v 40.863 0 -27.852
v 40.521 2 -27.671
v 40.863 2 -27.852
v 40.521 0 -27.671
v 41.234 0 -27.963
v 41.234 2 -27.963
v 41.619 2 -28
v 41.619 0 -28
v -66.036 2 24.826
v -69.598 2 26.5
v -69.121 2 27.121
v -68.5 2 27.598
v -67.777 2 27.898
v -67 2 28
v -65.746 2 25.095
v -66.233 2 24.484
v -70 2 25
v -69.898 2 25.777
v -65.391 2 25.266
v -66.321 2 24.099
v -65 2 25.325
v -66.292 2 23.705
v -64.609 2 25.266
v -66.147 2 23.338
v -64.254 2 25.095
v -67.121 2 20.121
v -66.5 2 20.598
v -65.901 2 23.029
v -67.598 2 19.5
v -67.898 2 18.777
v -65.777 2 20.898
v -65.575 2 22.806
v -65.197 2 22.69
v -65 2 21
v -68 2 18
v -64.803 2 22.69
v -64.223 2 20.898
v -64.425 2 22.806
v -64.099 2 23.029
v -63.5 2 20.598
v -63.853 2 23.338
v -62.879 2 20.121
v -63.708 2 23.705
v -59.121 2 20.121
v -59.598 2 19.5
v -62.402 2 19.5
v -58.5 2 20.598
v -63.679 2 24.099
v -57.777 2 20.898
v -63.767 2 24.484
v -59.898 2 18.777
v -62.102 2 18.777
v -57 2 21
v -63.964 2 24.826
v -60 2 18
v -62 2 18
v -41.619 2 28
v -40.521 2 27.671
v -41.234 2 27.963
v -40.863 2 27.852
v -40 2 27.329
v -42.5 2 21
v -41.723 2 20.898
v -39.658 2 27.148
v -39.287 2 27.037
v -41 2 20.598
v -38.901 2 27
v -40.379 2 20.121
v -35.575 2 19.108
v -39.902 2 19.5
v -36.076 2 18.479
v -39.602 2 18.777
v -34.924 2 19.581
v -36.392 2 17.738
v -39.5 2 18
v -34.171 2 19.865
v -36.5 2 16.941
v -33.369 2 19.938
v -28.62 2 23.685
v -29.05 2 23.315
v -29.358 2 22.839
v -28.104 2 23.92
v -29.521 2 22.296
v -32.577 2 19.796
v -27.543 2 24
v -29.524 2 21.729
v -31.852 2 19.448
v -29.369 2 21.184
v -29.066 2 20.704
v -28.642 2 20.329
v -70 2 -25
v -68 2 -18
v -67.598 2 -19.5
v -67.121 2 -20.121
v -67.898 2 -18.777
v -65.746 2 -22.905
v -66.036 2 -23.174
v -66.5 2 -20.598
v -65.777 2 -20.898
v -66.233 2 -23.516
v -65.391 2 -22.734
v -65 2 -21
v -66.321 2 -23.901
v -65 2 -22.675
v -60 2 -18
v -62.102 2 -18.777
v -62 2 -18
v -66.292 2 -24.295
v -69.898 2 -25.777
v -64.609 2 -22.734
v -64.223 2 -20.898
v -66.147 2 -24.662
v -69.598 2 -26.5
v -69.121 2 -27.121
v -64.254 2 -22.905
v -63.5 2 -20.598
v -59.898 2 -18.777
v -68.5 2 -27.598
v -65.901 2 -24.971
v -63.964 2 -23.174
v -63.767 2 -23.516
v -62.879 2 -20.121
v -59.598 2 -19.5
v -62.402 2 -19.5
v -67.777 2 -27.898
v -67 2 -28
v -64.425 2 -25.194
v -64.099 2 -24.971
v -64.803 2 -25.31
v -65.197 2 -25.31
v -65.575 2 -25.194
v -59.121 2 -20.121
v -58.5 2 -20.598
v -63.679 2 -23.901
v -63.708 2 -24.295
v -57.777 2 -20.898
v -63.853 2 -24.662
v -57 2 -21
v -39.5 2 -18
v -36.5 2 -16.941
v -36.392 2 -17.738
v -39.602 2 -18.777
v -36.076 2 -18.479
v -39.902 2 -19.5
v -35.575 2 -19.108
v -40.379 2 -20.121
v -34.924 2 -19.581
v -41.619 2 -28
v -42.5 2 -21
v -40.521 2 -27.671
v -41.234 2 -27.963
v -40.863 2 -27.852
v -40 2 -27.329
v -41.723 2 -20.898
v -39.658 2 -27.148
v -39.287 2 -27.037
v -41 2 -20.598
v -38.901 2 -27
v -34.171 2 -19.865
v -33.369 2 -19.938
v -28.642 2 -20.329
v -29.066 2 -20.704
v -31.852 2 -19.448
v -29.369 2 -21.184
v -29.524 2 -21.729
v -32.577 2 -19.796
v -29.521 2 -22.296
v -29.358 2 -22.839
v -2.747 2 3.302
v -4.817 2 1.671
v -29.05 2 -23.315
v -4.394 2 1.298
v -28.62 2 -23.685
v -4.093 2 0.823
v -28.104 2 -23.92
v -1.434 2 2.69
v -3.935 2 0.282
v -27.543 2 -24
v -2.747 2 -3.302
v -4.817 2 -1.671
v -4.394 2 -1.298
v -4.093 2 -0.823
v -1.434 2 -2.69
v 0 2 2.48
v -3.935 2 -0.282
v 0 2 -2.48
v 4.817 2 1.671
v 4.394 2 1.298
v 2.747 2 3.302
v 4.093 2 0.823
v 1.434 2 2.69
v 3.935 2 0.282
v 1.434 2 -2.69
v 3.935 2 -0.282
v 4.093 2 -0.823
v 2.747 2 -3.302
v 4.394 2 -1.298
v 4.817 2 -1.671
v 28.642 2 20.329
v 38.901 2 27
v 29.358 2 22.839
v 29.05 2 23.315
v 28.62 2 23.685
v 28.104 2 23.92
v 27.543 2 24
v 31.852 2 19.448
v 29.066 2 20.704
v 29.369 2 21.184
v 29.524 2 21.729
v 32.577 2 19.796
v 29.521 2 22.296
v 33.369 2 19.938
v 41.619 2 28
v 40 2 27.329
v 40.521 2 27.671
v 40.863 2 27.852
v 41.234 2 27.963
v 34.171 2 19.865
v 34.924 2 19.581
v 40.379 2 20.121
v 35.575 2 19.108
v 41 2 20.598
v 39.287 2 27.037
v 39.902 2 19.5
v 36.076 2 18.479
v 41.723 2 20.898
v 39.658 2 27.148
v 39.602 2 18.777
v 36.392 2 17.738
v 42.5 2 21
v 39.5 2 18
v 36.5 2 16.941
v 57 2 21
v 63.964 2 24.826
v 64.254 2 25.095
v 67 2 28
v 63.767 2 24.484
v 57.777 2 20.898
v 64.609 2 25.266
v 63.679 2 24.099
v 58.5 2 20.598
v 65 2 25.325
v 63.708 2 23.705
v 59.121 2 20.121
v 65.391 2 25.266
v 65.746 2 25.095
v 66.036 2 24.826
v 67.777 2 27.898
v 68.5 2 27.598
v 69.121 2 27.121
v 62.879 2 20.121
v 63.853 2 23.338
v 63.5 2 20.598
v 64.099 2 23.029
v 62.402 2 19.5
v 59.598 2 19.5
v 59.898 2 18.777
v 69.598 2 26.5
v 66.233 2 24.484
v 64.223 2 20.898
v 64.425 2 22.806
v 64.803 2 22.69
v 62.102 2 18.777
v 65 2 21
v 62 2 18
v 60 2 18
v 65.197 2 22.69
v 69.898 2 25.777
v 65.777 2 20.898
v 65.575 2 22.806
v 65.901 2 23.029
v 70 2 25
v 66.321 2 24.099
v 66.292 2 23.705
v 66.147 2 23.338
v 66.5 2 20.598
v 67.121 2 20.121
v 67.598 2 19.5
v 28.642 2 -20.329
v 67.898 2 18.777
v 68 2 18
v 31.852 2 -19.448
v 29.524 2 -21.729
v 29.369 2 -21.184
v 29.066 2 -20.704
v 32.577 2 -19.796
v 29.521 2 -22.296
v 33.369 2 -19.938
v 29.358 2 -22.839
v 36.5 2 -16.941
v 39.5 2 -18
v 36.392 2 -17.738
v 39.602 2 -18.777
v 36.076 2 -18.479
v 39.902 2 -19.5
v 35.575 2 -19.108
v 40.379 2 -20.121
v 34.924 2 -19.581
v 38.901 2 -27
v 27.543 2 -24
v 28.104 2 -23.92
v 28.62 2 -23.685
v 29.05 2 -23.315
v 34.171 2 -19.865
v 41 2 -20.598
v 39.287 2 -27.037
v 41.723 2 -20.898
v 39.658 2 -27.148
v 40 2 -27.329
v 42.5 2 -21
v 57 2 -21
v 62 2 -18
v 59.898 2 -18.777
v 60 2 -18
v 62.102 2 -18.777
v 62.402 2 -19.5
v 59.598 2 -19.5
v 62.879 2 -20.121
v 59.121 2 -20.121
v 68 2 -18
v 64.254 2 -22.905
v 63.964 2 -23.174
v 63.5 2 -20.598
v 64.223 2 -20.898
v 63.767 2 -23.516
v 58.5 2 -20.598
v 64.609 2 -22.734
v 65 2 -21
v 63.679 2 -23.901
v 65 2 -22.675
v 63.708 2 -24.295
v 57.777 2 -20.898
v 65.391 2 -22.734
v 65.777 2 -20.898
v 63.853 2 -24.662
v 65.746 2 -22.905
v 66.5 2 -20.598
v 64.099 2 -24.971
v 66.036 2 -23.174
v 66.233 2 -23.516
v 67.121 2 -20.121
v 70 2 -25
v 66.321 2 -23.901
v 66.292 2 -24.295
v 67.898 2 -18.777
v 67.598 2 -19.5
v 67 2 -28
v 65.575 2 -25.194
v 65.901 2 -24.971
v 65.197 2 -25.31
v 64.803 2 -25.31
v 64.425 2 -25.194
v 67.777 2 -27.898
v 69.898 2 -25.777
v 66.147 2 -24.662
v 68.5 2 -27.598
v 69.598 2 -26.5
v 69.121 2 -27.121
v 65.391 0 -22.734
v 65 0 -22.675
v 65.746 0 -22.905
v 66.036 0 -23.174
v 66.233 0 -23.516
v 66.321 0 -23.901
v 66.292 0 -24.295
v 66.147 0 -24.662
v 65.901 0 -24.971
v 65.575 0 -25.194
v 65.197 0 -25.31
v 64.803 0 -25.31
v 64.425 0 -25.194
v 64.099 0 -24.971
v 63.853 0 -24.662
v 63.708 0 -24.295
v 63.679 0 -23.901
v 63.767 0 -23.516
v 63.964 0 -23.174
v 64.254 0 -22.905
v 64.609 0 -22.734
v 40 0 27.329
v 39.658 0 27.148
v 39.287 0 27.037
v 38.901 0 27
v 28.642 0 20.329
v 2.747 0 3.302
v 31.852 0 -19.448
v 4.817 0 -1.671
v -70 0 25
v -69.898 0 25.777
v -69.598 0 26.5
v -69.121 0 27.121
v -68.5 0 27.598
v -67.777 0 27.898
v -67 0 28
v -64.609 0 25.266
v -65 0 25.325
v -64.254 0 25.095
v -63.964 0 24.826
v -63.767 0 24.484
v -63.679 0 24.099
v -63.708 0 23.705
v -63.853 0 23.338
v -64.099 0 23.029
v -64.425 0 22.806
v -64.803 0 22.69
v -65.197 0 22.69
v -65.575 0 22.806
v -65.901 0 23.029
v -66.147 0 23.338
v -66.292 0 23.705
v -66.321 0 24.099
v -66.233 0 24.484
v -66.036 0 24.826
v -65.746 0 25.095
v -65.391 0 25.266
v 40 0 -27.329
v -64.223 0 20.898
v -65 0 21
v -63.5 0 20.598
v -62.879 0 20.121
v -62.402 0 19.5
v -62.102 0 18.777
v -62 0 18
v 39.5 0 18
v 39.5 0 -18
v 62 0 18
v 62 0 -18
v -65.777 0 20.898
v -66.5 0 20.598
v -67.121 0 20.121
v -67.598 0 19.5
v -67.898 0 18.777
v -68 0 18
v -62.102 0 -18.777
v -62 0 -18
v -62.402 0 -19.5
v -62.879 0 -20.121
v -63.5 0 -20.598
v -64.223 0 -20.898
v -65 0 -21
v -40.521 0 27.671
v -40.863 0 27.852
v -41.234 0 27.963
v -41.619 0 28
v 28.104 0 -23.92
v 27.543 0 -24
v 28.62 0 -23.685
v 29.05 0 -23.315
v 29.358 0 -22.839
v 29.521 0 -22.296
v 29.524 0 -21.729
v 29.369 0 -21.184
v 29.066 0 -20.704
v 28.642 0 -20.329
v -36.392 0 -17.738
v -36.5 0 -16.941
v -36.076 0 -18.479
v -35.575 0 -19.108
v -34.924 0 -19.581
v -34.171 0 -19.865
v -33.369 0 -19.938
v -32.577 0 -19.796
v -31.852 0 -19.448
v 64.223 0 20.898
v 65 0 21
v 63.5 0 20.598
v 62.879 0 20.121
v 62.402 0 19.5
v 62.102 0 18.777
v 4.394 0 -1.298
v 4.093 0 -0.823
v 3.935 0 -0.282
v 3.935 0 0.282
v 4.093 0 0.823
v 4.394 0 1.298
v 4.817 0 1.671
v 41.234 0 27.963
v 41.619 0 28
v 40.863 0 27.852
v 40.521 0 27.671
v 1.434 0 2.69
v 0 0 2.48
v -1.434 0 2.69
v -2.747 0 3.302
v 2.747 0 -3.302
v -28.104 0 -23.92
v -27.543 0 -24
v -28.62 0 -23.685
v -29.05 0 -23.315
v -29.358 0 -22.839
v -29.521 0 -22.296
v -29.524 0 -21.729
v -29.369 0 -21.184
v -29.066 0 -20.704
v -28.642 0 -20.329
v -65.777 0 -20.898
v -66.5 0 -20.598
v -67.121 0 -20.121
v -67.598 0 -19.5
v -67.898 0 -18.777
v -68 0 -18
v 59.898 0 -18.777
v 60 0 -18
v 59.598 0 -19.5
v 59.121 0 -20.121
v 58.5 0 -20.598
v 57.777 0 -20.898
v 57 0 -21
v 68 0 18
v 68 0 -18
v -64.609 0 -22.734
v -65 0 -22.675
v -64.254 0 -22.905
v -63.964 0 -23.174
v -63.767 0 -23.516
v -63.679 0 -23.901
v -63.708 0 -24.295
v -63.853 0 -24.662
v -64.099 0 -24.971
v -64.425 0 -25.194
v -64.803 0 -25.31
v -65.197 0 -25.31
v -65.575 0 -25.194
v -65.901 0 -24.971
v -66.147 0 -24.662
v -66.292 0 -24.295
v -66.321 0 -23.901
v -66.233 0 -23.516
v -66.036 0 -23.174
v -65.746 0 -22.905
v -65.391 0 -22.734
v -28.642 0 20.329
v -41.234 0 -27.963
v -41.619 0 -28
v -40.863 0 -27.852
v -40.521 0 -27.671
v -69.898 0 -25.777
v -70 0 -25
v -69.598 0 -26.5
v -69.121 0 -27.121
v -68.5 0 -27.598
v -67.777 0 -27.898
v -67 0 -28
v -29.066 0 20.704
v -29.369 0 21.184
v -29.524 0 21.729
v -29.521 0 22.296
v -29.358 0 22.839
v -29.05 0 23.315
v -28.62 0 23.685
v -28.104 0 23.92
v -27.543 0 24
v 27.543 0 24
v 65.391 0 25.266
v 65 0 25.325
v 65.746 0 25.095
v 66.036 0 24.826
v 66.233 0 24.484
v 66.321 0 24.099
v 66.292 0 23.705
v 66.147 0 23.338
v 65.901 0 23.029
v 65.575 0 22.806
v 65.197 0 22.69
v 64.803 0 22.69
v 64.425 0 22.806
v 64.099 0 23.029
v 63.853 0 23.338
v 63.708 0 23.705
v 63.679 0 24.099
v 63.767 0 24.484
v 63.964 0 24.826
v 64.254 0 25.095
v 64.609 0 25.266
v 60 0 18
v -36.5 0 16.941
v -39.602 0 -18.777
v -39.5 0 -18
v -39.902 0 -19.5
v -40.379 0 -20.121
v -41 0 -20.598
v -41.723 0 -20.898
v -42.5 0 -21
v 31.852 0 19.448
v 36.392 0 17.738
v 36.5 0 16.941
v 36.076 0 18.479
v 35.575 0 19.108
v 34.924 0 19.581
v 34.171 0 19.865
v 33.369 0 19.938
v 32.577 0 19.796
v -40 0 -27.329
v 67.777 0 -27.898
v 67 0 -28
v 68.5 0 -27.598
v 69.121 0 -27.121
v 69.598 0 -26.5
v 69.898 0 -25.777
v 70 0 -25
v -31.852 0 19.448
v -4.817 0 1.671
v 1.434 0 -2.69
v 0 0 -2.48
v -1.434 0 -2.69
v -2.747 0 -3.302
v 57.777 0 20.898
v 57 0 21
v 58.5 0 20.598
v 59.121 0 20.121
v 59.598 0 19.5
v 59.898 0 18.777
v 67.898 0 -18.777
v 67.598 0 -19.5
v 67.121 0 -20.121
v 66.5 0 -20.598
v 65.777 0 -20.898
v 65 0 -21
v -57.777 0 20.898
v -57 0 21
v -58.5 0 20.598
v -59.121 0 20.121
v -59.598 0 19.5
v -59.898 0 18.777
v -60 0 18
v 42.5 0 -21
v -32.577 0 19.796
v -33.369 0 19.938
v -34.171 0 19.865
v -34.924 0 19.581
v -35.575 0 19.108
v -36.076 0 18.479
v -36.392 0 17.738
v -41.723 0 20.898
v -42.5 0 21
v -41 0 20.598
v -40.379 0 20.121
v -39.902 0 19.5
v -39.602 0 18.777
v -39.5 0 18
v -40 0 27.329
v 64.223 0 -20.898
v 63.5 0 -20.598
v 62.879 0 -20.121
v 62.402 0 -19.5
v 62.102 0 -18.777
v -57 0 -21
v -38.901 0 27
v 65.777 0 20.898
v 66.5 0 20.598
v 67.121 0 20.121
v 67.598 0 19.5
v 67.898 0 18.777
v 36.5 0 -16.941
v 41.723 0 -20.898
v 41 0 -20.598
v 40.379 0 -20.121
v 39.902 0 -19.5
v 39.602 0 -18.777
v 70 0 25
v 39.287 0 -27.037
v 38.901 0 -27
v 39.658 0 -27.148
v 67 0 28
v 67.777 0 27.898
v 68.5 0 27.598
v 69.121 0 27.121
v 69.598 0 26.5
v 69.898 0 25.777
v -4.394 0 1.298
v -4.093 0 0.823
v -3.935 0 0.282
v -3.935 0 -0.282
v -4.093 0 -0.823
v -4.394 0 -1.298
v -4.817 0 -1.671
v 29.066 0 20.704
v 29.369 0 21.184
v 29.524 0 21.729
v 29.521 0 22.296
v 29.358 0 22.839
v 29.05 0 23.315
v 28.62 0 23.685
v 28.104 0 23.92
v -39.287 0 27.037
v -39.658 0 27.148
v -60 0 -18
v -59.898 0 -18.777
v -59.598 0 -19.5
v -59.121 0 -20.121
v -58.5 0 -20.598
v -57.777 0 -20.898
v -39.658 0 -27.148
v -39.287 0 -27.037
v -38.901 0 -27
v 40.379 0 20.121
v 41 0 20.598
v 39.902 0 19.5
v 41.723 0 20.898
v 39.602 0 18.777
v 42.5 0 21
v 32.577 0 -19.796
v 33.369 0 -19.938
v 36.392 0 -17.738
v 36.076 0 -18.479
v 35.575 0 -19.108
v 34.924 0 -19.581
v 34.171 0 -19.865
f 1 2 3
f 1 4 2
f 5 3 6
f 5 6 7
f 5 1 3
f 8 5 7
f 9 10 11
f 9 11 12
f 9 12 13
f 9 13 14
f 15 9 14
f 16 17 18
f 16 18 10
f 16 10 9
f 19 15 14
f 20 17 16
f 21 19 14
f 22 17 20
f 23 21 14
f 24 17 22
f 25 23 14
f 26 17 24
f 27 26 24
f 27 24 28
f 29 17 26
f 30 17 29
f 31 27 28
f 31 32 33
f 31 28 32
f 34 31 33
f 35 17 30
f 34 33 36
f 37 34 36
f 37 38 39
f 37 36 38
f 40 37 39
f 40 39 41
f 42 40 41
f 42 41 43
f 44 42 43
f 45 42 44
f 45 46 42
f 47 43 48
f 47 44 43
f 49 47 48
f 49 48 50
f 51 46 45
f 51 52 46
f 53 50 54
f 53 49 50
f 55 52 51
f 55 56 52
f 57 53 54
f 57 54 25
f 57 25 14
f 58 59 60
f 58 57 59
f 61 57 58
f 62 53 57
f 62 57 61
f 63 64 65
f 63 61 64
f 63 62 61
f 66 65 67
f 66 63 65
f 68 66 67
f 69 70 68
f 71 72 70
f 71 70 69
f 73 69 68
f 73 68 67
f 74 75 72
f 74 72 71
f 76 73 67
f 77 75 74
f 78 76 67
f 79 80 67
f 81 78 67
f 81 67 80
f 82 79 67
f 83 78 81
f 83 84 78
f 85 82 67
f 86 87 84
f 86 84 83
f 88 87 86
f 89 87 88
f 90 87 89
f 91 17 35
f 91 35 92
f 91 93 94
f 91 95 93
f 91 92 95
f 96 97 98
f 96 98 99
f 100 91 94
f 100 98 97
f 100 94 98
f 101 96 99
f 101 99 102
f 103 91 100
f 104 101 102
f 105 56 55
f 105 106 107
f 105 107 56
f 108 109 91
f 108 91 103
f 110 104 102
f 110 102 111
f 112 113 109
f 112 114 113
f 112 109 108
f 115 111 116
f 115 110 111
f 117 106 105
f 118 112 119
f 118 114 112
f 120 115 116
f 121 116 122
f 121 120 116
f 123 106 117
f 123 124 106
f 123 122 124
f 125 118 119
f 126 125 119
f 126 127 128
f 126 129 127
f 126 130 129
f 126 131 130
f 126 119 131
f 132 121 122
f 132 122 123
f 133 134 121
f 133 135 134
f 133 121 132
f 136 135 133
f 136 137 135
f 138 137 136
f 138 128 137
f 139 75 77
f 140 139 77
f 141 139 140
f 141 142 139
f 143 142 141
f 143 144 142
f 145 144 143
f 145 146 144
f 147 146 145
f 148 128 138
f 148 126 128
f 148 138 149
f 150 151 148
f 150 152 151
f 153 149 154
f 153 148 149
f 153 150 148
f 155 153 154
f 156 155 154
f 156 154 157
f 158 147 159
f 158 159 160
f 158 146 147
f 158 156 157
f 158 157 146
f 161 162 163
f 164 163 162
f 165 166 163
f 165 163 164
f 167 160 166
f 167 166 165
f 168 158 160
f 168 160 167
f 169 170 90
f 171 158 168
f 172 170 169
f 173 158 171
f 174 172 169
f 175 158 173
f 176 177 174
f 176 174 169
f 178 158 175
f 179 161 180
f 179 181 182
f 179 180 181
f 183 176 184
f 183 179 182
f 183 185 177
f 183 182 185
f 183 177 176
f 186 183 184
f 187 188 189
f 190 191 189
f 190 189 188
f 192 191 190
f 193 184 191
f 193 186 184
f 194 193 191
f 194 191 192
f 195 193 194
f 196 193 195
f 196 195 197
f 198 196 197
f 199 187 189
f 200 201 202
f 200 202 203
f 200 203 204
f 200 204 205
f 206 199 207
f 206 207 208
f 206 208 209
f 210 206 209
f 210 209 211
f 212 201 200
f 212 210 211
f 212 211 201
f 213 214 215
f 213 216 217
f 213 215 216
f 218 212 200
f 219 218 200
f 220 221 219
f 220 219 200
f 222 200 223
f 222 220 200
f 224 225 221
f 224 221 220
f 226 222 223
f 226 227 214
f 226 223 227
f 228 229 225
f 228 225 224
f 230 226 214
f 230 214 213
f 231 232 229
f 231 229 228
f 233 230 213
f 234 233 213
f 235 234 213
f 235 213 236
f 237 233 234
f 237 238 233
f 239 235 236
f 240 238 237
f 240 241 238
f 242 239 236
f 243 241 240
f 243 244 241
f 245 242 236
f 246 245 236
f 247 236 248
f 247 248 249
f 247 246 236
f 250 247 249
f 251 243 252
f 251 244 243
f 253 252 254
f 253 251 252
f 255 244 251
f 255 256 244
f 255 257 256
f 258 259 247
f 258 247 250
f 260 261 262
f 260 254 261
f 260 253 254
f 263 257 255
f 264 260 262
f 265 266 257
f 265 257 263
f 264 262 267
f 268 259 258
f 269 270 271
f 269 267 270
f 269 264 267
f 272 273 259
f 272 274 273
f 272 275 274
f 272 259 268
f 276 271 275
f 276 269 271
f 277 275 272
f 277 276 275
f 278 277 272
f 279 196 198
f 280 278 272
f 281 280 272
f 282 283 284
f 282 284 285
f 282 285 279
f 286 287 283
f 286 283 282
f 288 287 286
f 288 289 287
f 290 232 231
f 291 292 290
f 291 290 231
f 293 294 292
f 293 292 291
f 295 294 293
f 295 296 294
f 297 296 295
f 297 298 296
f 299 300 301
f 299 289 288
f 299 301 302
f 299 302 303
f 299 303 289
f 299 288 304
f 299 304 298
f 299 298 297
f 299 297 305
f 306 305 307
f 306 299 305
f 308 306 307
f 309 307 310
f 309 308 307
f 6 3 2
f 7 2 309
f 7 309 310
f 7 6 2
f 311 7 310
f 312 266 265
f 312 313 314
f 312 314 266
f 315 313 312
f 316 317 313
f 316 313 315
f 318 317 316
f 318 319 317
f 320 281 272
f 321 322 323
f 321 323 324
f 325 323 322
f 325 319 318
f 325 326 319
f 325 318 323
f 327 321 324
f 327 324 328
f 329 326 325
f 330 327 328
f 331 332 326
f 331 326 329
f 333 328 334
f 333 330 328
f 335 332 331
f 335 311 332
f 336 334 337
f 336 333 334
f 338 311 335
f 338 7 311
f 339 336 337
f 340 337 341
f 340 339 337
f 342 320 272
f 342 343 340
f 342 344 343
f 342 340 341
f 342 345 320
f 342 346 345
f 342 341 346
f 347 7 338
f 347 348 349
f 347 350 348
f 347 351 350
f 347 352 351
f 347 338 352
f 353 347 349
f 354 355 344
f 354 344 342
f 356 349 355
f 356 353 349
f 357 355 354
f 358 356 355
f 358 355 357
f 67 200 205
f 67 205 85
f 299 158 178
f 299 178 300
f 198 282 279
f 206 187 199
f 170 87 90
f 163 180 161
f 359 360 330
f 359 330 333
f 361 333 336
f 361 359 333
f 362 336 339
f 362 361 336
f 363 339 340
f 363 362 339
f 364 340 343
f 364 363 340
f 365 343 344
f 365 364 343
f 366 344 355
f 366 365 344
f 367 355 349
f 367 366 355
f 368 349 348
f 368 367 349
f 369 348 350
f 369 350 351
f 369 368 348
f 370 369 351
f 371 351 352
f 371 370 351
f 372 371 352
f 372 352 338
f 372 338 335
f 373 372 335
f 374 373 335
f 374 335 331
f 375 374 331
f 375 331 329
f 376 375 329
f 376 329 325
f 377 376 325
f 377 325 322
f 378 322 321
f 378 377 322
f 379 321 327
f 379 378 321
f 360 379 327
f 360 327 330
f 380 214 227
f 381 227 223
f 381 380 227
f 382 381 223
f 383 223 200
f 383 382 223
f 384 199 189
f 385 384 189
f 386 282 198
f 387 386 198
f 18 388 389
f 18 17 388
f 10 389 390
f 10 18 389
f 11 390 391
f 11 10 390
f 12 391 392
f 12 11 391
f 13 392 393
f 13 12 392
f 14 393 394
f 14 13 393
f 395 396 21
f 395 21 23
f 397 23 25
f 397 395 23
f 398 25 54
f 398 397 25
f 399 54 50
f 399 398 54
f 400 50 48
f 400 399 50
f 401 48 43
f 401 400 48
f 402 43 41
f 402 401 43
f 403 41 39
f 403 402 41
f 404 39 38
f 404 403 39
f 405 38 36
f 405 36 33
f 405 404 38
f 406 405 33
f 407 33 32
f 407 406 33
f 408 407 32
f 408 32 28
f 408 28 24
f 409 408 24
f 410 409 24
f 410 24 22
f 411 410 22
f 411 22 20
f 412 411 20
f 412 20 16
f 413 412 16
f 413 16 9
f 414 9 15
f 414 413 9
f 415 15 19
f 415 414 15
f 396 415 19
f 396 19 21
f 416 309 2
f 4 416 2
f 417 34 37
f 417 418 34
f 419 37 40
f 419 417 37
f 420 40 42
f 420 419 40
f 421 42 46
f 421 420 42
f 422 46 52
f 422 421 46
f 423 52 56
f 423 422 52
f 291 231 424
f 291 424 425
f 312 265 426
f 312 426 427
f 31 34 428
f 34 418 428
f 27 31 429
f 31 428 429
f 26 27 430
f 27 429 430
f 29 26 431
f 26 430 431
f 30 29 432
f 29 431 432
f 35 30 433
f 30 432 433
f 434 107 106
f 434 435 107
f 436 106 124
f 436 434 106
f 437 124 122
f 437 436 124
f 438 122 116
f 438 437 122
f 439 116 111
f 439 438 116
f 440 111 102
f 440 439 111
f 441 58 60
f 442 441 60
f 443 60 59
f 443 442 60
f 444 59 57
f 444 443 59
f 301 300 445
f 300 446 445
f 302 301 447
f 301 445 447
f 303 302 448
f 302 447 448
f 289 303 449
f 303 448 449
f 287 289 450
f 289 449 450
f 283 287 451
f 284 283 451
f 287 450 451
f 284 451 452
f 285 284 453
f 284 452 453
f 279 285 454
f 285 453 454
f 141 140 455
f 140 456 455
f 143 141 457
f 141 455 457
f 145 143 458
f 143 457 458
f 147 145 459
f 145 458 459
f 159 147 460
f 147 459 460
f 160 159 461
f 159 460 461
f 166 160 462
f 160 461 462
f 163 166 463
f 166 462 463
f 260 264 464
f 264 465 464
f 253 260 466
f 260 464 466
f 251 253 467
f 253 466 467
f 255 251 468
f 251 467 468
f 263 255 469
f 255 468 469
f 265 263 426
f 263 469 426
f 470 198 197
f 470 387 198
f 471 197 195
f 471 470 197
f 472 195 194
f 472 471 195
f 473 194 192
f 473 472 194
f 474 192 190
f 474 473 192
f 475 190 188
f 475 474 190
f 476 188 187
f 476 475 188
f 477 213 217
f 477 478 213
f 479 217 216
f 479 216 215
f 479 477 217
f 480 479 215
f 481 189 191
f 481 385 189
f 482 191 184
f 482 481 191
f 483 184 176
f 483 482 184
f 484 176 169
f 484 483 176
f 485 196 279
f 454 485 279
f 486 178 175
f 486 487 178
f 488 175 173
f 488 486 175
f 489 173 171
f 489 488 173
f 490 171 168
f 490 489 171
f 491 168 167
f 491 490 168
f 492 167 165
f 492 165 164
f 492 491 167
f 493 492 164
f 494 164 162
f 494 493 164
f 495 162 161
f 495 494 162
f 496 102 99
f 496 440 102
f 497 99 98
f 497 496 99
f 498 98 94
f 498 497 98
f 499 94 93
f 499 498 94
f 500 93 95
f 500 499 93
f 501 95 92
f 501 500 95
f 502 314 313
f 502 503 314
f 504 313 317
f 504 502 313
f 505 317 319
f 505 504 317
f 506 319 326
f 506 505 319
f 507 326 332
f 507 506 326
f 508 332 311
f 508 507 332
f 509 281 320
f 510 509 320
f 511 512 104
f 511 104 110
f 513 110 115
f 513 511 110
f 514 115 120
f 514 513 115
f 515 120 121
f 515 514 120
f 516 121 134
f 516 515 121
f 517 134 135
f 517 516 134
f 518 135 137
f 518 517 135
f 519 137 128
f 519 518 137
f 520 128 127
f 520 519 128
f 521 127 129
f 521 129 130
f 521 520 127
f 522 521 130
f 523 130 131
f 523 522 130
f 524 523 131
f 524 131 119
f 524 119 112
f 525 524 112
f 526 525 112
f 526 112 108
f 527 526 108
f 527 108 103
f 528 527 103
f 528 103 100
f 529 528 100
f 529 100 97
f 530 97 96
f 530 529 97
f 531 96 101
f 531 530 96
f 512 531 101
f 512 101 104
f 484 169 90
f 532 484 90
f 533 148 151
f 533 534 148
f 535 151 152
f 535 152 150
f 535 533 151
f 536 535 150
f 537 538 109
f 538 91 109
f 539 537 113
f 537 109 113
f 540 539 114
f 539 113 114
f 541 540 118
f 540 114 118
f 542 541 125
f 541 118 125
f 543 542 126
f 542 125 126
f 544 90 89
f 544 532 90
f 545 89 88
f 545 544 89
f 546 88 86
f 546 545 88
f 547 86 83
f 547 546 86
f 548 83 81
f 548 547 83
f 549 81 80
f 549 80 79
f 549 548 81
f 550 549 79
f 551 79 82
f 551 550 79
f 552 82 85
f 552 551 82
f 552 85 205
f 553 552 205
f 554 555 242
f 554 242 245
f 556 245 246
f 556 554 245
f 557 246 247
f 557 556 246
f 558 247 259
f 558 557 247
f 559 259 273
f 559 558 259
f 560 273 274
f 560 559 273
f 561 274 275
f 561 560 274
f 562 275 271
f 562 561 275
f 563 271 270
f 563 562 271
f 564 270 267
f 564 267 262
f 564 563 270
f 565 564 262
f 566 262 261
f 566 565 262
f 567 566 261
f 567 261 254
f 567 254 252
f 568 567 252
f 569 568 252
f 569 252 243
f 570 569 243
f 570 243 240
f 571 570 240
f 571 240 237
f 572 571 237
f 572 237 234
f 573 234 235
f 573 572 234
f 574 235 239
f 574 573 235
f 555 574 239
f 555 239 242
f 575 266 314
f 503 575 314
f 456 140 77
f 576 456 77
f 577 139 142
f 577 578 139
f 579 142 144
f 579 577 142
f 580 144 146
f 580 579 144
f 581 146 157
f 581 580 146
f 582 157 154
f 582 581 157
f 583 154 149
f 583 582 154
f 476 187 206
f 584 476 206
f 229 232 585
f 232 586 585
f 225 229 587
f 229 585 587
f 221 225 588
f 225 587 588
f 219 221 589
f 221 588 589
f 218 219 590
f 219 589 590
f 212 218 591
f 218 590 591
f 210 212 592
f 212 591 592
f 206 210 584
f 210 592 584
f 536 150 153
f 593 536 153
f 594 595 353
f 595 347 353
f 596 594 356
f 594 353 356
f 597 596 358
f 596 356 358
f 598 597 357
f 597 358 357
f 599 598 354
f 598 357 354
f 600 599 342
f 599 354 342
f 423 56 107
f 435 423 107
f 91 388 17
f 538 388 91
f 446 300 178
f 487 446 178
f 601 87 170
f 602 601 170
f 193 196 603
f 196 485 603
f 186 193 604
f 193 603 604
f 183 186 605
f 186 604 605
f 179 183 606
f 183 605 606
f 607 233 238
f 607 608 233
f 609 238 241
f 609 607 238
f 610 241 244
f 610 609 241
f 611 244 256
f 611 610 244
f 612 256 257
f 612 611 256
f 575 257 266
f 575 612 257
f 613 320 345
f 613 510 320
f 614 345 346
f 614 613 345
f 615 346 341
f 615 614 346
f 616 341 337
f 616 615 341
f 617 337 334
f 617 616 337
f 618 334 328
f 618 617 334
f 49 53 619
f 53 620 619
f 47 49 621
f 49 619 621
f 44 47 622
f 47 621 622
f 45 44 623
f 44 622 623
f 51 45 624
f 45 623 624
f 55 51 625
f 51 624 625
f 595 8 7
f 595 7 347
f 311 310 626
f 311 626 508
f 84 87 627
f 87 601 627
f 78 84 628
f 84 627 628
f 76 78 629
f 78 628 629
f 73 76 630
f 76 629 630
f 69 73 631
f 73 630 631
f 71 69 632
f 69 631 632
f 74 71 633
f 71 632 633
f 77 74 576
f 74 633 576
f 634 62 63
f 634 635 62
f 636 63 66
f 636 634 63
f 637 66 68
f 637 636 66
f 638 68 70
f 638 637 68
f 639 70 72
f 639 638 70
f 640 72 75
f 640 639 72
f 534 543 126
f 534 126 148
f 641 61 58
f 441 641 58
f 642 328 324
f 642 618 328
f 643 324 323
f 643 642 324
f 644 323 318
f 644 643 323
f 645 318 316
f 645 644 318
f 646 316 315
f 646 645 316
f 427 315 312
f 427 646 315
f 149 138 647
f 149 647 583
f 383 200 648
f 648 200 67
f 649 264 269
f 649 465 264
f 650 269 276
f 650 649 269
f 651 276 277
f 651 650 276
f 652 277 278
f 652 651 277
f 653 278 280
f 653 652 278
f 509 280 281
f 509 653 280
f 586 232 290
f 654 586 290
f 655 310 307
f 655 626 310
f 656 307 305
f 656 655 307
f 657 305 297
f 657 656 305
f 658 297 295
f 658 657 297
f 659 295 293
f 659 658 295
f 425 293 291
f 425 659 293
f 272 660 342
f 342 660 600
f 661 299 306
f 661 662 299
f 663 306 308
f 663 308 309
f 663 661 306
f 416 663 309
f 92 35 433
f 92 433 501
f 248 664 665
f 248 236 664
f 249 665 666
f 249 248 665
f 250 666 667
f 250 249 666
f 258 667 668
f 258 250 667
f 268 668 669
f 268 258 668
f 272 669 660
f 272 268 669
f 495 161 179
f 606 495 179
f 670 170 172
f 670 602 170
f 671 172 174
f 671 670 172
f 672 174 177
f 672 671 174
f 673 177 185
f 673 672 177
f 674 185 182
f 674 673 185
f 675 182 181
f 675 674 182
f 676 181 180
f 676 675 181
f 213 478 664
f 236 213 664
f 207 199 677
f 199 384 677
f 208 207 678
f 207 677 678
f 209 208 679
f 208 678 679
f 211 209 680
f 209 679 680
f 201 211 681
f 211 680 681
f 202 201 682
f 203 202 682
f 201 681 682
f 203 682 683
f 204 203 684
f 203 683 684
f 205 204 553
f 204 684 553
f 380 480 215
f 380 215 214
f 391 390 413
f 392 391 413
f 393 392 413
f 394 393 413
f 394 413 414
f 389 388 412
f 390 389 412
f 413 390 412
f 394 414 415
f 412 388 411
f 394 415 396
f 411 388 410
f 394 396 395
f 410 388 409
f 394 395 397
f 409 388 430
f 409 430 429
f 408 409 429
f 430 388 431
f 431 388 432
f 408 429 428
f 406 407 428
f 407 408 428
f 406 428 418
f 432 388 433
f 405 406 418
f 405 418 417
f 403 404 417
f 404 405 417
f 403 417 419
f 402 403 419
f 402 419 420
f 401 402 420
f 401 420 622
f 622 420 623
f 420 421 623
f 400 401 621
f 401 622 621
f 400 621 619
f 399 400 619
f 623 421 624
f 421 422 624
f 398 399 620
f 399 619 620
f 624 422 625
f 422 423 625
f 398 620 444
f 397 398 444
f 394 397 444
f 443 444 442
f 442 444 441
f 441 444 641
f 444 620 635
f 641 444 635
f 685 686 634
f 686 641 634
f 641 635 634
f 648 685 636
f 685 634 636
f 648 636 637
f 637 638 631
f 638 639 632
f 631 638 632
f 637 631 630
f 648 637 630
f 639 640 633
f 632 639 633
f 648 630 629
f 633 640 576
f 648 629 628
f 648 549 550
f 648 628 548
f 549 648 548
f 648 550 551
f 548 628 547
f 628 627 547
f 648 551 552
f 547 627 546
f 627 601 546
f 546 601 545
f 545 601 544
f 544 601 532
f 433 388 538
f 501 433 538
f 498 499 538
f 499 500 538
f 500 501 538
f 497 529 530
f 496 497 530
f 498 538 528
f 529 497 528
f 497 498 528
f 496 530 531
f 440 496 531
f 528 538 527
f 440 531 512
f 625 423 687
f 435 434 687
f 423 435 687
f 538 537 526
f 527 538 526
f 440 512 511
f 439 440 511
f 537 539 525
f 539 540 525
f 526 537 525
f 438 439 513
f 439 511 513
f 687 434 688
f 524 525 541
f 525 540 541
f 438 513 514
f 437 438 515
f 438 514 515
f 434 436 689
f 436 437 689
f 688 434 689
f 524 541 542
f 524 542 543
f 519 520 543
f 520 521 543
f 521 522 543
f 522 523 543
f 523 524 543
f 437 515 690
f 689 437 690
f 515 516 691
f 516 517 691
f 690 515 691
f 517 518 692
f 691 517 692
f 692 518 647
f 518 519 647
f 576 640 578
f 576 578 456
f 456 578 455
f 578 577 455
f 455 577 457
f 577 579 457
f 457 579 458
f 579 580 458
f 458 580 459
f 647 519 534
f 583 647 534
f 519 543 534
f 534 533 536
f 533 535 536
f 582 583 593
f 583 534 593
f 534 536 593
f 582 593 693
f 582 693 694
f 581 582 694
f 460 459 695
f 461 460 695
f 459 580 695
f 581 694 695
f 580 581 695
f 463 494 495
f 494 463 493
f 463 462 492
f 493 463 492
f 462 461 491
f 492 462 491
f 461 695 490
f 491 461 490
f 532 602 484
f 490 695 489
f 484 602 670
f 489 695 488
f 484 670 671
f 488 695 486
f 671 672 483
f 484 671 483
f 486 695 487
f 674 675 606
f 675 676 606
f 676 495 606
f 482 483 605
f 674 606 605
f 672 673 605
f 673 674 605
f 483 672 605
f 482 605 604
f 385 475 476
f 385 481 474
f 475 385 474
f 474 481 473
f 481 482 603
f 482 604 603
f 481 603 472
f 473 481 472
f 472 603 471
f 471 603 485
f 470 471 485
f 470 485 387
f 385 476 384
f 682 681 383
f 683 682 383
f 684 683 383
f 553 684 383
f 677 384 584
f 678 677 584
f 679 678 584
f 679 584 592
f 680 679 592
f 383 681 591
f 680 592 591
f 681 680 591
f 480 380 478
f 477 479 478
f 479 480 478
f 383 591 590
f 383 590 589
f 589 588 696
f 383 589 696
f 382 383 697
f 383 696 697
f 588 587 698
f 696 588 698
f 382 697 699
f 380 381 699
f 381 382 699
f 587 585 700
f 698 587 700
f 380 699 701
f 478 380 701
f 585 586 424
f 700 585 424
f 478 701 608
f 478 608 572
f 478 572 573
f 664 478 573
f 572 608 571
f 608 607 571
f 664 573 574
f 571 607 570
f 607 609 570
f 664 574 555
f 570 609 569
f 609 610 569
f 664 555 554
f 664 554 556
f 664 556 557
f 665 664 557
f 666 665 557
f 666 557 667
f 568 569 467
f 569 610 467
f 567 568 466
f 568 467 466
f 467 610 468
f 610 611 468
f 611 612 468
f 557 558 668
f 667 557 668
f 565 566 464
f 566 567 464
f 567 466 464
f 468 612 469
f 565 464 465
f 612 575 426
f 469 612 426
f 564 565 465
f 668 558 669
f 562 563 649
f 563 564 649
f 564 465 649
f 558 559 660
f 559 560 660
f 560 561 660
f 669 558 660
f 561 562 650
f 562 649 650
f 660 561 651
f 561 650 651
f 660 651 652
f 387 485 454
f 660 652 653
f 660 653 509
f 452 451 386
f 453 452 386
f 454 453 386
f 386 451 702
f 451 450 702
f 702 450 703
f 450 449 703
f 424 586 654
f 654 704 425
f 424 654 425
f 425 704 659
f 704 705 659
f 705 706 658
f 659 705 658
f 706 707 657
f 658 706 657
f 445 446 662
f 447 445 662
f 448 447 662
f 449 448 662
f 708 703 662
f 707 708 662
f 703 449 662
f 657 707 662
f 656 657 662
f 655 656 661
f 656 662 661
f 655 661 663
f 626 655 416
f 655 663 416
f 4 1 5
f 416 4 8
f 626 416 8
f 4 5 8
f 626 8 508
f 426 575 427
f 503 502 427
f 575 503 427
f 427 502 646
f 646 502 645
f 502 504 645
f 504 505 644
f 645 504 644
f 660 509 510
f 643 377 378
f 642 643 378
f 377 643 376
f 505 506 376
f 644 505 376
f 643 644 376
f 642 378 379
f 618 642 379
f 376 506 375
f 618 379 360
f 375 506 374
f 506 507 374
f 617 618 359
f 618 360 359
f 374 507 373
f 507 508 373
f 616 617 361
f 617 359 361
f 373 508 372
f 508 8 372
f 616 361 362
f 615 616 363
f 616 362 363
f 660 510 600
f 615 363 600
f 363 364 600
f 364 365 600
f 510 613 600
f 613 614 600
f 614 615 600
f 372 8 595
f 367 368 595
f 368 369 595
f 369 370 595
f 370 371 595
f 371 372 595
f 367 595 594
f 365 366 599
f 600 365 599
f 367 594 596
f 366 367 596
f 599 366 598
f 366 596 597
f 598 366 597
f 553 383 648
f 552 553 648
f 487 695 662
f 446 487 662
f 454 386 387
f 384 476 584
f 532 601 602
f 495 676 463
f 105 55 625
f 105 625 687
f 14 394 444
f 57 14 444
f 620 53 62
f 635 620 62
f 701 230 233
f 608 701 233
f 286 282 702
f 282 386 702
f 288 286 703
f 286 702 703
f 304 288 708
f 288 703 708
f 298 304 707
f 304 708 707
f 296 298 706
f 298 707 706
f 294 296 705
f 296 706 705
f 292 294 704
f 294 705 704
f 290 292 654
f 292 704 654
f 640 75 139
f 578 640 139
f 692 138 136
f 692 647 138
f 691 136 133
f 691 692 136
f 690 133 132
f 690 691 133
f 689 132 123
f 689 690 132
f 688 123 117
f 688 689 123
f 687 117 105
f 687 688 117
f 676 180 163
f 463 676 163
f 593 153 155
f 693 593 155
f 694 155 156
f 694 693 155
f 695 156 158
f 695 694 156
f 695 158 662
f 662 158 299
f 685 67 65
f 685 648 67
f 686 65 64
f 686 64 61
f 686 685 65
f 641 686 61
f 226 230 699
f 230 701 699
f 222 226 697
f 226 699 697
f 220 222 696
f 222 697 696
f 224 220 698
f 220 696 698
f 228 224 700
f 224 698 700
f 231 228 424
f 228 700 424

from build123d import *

# Parameters (mm, degrees)
SKETCH_1_W          = 140
SKETCH_1_H          = 56
SKETCH_1_R          = 1.325
EXTRUDE_1_DEPTH     = 2
SKETCH_3_W          = 20.5
SKETCH_3_H          = 42
SKETCH_3_W_2        = 6
CUT_EXTRUDE_1_DEPTH = 10
FILLET_1_R          = 3
FILLET_2_R          = 2
FILLET_3_R          = 3
FILLET_4_R          = 5
CUT_EXTRUDE_2_DEPTH = 76.41883054
FILLET_5_R          = 2


with BuildPart() as part:
    # 草图1 → 凸台-拉伸1 (new body)
    with BuildSketch(Plane(origin=(0, 0, 0), x_dir=(1, 0, 0), z_dir=(0, 1, 0))):
        Rectangle(SKETCH_1_W, SKETCH_1_H)
        with Locations(Location((-65, 24, 0), (0, 0, 270))):
            Circle(SKETCH_1_R, mode=Mode.SUBTRACT)
        with Locations(Location((65, 24, 0), (0, 0, 270))):
            Circle(SKETCH_1_R, mode=Mode.SUBTRACT)
        with Locations(Location((65, -24, 0), (0, 0, 270))):
            Circle(SKETCH_1_R, mode=Mode.SUBTRACT)
        with Locations(Location((-65, -24, 0), (0, 0, 270))):
            Circle(SKETCH_1_R, mode=Mode.SUBTRACT)
    extrude(amount=EXTRUDE_1_DEPTH)

    # 草图3 → 切除-拉伸1 (cut)
    with BuildSketch(Plane(origin=(0, 2, 0), x_dir=(1, 0, 0), z_dir=(0, 1, 0))):
        with Locations((-49.75, 0)):
            Rectangle(SKETCH_3_W, SKETCH_3_H)
        with Locations((-65, 0)):
            Rectangle(SKETCH_3_W_2, SKETCH_3_H)
        Polygon((-36.5, -22.50398901), (-2.275183381, 0), (-36.5, 22.50398901), align=None)
        Polygon((34.224816619, 24), (-34.224816619, 24), (0, 1.49601099), align=None)
        Polygon((36.5, 22.50398901), (2.275183381, 0), (36.5, -22.50398901), align=None)
        Polygon((34.224816619, -24), (0, -1.49601099), (-34.224816619, -24), align=None)
        with Locations((49.75, 0)):
            Rectangle(SKETCH_3_W, SKETCH_3_H)
        with Locations((65, 0)):
            Rectangle(SKETCH_3_W_2, SKETCH_3_H)
    extrude(amount=-CUT_EXTRUDE_1_DEPTH, mode=Mode.SUBTRACT)

    # 圆角1
    fillet_1_edges = [part.edges().sort_by_distance(p)[0] for p in [
        (68, 1, -21),
        (68, 1, 21),
        (62, 1, 21),
        (62, 1, -21),
        (-60, 1, 21),
        (-60, 1, -21),
        (-39.5, 1, -21),
        (-39.5, 1, 21),
        (70, 1, 28),
        (-70, 1, 28),
        (-70, 1, -28),
        (70, 1, -28),
        (-62, 1, -21),
        (-62, 1, 21),
        (-68, 1, 21),
        (-68, 1, -21),
        (60, 1, -21),
        (60, 1, 21),
        (39.5, 1, 21),
        (39.5, 1, -21),
    ]]
    fillet(fillet_1_edges, radius=FILLET_1_R - 0.0001)  # a hair under: the kernel refuses the full size

    # 圆角2
    fillet_2_edges = [part.edges().sort_by_distance(p)[0] for p in [
        (-34.224816619, 1, -24),
        (34.224816619, 1, -24),
        (2.275183381, 1, 0),
        (-2.275183381, 1, 0),
        (-34.224816619, 1, 24),
        (34.224816619, 1, 24),
    ]]
    fillet(fillet_2_edges, radius=FILLET_2_R)

    # 圆角3
    fillet_3_edges = [part.edges().sort_by_distance(p)[0] for p in [
        (36.5, 1, -22.50398901),
        (36.5, 1, 22.50398901),
        (-36.5, 1, -22.50398901),
        (-36.5, 1, 22.50398901),
    ]]
    fillet(fillet_3_edges, radius=FILLET_3_R)

    # 圆角4
    fillet_4_edges = [part.edges().sort_by_distance(p)[0] for p in [
        (0, 1, -1.49601099),
        (0, 1, 1.49601099),
    ]]
    fillet(fillet_4_edges, radius=FILLET_4_R)

    # 草图4 → 切除-拉伸2 (cut, through all)
    with BuildSketch(Plane(origin=(0, 2, 0), x_dir=(1, 0, 0), z_dir=(0, 1, 0))):
        Polygon((-41.020833333, 28), (-39.5, 27), (39.5, 27), (41.020833333, 28), align=None)
        Polygon((41.020833333, -28), (39.5, -27), (-39.5, -27), (-41.020833333, -28), align=None)
    extrude(amount=-CUT_EXTRUDE_2_DEPTH, mode=Mode.SUBTRACT)

    # 圆角5
    fillet_5_edges = [part.edges().sort_by_distance(p)[0] for p in [
        (-41.020833333, 1, -28),
        (41.020833333, 1, -28),
        (39.5, 1, -27),
        (-39.5, 1, -27),
        (41.020833333, 1, 28),
        (-41.020833333, 1, 28),
        (-39.5, 1, 27),
        (39.5, 1, 27),
    ]]
    fillet(fillet_5_edges, radius=FILLET_5_R)


solid = part.part
